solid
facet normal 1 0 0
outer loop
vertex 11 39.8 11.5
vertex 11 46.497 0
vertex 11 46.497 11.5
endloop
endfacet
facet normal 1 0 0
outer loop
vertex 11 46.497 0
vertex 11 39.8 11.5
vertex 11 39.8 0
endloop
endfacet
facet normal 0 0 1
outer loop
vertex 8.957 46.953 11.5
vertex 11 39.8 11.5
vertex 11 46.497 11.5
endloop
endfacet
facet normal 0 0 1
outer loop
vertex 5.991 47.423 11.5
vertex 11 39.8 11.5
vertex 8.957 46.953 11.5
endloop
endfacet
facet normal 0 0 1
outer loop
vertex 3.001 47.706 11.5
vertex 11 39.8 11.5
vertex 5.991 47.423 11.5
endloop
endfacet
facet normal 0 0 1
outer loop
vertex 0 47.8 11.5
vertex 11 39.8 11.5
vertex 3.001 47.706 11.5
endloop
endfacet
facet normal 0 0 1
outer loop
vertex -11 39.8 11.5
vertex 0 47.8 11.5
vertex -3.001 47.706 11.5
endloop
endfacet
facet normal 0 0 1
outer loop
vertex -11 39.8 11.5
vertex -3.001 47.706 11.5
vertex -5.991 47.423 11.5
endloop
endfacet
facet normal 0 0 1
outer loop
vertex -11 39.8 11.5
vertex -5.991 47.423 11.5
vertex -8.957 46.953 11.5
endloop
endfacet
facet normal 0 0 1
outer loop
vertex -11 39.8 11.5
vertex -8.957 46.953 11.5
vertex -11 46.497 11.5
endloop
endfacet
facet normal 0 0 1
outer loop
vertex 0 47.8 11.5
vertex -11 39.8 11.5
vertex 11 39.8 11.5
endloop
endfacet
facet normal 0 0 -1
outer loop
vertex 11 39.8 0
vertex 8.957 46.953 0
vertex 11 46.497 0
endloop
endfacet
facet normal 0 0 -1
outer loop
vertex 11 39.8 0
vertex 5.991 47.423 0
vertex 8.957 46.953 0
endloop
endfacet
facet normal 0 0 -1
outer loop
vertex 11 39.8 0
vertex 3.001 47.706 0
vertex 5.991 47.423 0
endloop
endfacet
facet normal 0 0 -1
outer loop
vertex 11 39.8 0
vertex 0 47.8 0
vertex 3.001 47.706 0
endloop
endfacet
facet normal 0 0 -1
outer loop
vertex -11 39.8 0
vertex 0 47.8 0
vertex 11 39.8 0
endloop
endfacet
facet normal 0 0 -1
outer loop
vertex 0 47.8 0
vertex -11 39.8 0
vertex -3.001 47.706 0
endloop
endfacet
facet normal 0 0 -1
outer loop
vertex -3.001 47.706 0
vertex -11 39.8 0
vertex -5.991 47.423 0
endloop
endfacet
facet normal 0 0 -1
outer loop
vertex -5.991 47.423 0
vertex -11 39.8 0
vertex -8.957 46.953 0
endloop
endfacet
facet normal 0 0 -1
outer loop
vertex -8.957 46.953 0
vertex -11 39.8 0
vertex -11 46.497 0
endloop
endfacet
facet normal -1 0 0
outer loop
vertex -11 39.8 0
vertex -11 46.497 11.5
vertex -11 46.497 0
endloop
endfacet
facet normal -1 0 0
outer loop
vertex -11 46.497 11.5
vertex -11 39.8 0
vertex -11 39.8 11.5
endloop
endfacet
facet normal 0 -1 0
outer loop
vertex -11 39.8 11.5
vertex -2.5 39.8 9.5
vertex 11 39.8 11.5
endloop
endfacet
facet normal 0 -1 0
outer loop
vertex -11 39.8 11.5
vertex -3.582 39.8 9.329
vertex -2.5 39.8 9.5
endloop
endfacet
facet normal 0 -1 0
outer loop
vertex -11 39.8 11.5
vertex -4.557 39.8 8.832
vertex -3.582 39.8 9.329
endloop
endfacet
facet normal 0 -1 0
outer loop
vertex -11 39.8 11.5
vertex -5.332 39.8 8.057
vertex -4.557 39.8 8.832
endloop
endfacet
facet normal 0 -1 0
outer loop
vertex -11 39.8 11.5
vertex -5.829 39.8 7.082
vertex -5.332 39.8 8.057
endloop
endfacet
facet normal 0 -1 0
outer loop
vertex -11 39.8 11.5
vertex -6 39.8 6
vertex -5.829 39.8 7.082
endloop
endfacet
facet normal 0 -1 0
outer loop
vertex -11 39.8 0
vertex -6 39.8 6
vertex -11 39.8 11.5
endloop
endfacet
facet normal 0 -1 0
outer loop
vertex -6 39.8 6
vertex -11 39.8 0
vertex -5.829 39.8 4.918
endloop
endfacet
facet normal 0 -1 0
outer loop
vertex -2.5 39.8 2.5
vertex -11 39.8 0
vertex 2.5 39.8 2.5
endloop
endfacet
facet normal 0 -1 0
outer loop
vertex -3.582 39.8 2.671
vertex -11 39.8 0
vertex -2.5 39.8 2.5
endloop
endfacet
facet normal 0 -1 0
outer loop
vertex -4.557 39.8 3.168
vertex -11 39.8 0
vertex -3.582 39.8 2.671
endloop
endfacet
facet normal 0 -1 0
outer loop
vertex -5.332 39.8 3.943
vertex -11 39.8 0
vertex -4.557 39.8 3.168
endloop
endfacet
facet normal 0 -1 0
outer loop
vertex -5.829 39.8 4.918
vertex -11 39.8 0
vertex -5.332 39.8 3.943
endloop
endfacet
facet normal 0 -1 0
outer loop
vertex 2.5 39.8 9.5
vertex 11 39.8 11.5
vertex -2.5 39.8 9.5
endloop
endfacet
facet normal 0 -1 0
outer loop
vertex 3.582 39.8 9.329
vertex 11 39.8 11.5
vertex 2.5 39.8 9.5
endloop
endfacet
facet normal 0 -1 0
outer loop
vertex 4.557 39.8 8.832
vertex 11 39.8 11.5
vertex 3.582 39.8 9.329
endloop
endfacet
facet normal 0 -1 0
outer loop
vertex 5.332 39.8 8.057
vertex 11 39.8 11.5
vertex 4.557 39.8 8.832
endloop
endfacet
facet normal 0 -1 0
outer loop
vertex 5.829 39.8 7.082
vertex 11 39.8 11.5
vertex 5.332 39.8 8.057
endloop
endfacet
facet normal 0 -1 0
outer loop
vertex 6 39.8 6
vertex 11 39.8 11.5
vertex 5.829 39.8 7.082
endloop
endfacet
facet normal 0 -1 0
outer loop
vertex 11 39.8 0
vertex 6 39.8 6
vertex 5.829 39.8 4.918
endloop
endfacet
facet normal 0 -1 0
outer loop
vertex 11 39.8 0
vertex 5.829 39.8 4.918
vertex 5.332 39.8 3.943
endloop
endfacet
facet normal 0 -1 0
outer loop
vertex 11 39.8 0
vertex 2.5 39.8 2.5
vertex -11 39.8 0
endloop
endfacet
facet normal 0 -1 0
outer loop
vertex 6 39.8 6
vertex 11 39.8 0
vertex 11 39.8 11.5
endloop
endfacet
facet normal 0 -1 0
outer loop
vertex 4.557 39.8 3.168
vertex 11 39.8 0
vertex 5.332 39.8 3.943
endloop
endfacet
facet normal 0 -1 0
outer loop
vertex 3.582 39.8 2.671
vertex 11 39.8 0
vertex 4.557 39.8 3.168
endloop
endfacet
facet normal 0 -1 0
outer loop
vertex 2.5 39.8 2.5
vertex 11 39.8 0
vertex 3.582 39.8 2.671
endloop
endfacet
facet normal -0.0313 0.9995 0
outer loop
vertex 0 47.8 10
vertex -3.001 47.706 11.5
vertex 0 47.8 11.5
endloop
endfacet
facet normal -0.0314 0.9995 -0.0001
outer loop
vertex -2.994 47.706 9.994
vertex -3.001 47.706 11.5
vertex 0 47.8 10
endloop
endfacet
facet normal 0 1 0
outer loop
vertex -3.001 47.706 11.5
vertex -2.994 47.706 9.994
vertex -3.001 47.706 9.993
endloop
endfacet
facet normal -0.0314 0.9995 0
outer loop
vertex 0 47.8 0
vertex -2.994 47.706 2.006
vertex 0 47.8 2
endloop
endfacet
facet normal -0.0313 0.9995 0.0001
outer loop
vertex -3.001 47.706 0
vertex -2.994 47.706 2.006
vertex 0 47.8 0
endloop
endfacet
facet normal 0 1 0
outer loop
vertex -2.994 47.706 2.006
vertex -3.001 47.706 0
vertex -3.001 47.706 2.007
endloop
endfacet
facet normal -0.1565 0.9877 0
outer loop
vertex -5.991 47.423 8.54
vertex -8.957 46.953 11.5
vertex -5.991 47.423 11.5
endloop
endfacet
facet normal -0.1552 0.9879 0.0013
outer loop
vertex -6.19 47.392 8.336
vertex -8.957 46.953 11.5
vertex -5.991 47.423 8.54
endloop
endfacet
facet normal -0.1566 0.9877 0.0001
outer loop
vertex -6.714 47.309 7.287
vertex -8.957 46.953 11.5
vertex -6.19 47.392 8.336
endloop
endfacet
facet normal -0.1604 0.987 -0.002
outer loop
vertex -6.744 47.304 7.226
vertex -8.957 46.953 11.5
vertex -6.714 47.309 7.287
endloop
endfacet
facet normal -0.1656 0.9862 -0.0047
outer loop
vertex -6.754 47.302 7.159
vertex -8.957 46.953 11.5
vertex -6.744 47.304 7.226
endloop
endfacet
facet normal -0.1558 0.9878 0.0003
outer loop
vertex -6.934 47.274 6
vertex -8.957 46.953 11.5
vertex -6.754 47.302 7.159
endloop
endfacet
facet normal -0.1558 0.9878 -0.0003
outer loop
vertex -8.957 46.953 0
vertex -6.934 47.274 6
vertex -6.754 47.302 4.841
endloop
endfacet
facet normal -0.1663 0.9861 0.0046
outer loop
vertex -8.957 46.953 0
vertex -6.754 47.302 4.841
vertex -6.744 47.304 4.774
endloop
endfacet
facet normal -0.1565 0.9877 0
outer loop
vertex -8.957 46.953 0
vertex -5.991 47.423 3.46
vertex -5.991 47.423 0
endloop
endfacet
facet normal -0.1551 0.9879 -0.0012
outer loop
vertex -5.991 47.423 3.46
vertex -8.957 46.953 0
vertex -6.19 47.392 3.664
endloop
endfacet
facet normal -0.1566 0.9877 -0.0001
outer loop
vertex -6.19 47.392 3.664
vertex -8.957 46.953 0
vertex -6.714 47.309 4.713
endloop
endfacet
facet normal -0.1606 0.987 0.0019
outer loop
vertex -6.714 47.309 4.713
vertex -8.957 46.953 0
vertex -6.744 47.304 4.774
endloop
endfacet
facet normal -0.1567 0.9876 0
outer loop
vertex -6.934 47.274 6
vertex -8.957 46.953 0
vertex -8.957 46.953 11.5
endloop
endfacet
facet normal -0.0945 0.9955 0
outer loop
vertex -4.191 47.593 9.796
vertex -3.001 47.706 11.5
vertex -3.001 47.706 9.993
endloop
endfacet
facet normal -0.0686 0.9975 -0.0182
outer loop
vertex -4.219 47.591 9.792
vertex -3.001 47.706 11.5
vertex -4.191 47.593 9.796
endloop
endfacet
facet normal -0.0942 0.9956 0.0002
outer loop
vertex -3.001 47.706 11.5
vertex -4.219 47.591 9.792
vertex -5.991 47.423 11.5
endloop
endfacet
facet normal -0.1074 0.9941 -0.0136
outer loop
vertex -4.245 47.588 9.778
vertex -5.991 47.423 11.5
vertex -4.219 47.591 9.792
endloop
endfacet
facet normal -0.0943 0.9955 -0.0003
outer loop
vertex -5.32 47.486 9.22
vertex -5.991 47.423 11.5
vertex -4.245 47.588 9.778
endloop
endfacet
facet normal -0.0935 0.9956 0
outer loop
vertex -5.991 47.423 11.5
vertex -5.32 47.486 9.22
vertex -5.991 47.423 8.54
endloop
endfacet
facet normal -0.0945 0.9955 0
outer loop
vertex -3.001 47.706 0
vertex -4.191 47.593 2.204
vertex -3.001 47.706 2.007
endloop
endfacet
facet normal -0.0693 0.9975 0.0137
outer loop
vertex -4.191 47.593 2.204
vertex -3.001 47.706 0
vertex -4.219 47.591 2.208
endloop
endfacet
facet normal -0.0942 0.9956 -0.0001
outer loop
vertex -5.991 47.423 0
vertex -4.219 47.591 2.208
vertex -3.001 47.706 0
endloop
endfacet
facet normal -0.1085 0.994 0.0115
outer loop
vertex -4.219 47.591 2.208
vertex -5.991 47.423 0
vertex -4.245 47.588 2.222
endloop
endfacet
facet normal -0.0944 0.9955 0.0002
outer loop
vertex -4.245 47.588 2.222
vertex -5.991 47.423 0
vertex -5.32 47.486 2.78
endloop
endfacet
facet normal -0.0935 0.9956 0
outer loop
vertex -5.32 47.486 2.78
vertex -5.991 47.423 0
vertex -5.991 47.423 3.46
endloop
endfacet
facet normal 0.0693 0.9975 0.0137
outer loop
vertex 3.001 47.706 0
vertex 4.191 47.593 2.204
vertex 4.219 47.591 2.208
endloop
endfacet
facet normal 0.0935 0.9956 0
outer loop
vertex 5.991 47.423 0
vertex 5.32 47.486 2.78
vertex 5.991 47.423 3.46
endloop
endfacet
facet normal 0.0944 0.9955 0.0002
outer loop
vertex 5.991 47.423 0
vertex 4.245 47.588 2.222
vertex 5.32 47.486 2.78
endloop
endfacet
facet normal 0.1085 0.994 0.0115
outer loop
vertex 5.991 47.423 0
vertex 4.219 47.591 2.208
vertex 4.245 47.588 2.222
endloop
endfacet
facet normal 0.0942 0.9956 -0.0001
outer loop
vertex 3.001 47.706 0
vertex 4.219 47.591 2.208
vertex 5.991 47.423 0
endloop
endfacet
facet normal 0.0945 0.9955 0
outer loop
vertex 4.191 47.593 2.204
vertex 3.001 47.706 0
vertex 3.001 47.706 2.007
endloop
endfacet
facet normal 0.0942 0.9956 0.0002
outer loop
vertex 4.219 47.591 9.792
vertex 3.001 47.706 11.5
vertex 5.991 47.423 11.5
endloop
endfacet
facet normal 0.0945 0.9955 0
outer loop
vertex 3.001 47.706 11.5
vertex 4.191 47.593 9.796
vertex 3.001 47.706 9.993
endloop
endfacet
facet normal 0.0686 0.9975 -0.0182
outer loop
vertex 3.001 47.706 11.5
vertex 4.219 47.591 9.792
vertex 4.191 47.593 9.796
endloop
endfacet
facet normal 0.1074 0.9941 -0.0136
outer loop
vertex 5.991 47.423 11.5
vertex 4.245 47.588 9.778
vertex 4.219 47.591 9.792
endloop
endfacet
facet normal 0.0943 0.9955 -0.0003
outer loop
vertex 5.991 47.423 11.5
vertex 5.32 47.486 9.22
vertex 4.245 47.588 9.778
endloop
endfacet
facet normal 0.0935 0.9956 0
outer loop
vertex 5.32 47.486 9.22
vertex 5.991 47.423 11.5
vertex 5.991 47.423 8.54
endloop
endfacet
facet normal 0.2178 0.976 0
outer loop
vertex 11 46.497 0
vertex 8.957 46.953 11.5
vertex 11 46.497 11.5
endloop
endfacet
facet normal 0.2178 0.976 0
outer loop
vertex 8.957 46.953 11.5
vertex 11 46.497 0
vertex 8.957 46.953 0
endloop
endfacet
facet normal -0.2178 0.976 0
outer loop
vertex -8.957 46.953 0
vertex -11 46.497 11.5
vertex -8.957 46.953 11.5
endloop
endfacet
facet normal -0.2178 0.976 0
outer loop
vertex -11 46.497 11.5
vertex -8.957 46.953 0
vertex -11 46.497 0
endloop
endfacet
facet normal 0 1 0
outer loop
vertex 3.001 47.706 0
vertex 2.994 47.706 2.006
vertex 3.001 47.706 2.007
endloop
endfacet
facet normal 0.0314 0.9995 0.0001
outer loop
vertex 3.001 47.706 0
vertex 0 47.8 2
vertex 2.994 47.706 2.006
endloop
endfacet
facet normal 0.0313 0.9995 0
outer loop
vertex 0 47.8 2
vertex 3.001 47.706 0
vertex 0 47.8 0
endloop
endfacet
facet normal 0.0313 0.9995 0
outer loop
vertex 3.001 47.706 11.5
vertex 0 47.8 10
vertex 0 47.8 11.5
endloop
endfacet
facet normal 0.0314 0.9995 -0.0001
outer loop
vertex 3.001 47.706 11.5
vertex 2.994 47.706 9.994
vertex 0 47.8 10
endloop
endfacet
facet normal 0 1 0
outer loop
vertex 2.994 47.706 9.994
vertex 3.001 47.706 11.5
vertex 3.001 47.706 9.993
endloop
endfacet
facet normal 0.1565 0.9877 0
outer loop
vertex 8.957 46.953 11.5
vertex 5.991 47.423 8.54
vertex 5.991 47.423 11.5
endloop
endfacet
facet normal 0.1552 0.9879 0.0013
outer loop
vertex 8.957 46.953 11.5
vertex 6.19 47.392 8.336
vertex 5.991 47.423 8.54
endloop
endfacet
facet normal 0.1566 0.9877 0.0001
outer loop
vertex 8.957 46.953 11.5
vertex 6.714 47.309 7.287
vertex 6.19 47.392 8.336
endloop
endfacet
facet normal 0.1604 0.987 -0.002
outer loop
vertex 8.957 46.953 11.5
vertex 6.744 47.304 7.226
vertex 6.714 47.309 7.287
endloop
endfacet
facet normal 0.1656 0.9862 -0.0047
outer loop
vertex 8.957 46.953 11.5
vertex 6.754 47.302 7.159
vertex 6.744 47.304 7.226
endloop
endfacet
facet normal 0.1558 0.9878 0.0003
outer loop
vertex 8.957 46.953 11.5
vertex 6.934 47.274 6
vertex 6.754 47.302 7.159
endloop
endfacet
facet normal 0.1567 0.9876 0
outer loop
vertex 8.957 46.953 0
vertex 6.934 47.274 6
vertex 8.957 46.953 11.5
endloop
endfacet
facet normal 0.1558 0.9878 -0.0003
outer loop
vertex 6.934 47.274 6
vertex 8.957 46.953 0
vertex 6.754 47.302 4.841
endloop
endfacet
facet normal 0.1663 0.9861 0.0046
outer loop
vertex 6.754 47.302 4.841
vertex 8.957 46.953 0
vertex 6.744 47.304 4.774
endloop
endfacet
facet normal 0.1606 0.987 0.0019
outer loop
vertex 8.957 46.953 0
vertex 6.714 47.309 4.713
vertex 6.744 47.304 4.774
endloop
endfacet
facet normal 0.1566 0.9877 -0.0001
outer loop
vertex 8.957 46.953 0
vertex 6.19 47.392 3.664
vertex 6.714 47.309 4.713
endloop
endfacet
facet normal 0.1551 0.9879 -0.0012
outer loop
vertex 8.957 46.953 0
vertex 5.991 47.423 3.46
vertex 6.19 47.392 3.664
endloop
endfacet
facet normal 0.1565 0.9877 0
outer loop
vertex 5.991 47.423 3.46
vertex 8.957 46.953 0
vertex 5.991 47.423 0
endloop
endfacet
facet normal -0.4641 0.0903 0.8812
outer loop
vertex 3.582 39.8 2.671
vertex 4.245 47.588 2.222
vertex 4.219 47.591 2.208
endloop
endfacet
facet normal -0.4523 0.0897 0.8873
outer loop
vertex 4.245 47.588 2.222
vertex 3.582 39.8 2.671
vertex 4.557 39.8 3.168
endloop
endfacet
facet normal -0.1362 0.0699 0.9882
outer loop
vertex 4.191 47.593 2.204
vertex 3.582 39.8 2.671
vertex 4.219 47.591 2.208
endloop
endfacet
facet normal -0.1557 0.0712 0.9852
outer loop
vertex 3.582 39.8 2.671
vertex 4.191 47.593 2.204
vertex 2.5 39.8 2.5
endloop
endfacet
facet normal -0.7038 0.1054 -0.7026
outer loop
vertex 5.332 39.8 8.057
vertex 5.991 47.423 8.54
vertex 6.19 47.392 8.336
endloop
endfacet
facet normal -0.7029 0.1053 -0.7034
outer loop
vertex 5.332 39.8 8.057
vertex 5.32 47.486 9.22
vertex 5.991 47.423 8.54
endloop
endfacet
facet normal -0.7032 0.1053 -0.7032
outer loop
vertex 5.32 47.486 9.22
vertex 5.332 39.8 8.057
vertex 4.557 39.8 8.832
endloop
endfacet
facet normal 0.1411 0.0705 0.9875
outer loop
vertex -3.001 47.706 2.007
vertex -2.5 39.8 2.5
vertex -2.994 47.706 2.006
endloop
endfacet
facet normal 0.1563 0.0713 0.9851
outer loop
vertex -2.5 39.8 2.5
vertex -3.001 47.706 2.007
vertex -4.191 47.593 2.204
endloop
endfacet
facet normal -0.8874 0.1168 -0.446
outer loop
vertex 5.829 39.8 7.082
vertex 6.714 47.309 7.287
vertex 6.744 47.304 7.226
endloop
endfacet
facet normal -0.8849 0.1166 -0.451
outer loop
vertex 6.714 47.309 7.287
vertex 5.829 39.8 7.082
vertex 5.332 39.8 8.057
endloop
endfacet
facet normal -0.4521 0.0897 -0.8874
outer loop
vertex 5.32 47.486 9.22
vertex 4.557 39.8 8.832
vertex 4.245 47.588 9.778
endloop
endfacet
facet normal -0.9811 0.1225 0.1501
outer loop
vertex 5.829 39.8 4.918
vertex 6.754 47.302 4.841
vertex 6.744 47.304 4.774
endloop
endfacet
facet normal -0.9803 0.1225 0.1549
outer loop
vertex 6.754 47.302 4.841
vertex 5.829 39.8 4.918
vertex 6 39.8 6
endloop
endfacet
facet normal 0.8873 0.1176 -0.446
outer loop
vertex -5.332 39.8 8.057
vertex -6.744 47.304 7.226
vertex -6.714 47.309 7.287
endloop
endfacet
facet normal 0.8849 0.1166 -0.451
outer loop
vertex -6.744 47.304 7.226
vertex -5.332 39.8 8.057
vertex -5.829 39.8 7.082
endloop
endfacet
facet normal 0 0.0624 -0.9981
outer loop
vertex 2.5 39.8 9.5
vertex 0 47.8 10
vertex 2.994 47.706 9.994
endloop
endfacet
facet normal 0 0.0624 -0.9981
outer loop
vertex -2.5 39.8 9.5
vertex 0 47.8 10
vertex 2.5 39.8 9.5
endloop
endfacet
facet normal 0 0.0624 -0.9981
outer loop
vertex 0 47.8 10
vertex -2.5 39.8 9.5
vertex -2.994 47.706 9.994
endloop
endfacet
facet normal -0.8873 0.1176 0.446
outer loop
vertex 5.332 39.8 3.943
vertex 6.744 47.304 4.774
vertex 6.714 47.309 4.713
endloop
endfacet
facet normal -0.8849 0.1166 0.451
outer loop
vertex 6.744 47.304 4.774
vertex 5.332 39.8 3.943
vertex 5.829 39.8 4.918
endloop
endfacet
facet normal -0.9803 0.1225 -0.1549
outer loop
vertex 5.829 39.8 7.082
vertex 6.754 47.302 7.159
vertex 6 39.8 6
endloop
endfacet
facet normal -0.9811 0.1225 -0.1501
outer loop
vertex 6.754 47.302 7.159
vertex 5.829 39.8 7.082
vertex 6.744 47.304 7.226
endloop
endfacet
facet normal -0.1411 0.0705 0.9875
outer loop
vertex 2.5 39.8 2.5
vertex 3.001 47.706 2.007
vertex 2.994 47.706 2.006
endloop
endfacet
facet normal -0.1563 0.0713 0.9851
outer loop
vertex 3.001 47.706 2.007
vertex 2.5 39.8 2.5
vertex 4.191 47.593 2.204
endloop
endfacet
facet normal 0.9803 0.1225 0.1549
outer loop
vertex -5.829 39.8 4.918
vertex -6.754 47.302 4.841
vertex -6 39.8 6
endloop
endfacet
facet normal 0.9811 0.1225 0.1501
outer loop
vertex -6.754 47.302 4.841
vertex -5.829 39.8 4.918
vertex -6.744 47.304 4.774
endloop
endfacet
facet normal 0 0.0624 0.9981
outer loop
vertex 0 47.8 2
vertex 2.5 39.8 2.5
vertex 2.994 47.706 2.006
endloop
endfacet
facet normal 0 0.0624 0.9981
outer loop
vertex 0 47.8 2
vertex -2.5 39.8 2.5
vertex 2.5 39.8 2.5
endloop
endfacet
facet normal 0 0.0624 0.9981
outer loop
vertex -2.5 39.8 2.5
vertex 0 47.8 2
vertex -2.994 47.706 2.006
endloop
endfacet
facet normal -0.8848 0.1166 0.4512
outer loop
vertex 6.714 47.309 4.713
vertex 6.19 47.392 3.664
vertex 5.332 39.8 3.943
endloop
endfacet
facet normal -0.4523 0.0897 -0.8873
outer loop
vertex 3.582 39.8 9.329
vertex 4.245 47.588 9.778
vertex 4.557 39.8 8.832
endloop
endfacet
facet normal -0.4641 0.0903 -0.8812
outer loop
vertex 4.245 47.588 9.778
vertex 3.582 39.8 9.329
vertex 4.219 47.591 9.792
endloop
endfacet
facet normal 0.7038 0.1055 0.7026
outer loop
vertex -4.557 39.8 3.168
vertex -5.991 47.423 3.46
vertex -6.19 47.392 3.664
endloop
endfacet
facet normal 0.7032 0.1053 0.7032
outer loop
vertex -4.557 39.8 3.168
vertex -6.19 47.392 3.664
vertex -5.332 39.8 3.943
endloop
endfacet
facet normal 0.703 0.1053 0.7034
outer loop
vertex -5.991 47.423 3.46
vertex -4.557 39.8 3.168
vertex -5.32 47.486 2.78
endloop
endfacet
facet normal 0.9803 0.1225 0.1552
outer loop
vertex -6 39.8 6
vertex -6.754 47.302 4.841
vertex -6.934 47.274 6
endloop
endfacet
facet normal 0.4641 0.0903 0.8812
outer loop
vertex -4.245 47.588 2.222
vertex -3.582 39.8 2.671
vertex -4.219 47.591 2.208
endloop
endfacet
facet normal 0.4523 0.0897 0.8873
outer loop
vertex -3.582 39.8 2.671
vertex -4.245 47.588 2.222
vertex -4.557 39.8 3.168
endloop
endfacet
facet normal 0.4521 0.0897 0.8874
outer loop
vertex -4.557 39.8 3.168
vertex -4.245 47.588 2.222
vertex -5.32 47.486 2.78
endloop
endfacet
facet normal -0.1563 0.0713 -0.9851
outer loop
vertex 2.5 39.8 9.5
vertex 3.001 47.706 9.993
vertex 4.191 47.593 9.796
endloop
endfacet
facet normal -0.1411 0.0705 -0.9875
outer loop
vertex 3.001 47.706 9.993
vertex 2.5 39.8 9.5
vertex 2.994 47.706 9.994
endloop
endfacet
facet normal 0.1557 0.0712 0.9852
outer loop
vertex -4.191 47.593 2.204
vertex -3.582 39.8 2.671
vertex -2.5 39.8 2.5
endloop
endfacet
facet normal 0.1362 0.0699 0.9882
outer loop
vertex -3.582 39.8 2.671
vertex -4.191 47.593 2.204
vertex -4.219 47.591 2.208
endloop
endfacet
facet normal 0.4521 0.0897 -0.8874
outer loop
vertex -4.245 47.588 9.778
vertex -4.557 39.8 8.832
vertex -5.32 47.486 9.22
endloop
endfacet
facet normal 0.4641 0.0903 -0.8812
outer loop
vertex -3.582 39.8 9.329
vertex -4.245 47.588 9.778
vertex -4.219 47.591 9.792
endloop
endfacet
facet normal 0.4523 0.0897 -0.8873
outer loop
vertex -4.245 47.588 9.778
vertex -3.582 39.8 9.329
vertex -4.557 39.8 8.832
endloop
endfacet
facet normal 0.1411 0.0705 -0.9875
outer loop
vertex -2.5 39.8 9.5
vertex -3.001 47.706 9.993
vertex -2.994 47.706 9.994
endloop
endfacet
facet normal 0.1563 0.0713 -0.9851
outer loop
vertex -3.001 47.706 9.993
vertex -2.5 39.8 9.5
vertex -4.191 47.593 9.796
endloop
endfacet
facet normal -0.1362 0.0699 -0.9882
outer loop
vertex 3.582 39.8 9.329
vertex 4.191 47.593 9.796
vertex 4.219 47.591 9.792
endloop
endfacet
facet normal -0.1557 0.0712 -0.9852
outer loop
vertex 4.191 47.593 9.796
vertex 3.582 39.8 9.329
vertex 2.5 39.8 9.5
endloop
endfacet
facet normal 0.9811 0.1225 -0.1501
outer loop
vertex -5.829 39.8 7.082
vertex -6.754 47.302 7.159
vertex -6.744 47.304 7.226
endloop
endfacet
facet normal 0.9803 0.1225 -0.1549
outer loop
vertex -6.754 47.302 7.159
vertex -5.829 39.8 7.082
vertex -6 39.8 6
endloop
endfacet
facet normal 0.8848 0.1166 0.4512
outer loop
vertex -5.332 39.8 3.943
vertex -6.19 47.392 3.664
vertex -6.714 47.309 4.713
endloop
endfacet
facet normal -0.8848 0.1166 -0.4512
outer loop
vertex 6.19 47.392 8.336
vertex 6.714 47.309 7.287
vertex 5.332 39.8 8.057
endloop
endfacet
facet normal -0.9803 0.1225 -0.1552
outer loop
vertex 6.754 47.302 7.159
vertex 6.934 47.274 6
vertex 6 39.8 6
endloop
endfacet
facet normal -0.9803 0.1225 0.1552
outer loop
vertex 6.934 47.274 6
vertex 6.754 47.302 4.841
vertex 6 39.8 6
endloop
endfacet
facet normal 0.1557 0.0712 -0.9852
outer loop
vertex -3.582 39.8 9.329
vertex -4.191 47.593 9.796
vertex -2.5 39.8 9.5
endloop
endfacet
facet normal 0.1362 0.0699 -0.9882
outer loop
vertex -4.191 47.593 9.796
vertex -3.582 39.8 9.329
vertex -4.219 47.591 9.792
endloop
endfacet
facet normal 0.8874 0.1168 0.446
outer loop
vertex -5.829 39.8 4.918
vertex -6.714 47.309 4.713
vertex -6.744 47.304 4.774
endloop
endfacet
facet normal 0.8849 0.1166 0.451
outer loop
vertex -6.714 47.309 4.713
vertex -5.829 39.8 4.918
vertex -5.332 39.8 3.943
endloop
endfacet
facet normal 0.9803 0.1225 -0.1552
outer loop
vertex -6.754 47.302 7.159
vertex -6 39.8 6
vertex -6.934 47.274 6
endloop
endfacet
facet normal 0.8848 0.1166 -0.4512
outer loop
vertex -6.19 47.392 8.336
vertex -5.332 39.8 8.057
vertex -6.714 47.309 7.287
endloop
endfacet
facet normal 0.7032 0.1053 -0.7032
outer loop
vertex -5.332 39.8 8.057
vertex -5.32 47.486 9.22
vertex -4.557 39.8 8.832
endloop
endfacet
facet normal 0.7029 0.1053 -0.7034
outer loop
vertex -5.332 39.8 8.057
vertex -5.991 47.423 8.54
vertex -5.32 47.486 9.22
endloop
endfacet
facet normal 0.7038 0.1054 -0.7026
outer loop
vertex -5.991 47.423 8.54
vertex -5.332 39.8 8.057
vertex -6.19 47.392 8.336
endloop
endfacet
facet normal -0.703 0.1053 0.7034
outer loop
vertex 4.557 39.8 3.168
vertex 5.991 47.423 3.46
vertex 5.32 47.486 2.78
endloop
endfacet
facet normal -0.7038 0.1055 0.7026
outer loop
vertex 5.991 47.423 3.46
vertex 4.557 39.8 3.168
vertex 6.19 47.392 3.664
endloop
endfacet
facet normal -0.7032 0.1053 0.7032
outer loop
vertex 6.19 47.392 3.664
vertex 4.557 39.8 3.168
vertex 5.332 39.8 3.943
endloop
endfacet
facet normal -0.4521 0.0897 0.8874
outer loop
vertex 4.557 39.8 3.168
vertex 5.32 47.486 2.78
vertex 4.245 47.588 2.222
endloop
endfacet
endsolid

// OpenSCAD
// cache prise usb


di=95.6;  // diametre intérieur tube

l=22;
p=8;
h=11.5;

zu=6;
hu1=3.5;
hu2=7;
hu3=8;

lu1=8.5;
lu2=12;
lu3=14;

deaxe=0;

//centreur();
priseLampe();

module centreur()
{
    difference()
    {
    hull()
    {
        trouOblong(20,lu2-.5,hu2/2);
        translate([0,-3,0]) trouOblong(5,lu2-1.5,hu2/2-1);
    }
    translate([0,20-10,0]) rotate([-90,0,0]) cylinder(10,1.2,1.2,$fn=10);

    }
}

module priseLampe()
{

difference()
{

    intersection()
    {
        translate([-l/2,di/2-p,0]) cube([l,p,h]);
       cylinder(h,di/2,di/2,$fn=100); 
    }
    
    //translate([deaxe,di/2-p,zu]) trouOblong(p,lu1,hu1/2);
    hull()
    {
        translate([deaxe,di/2-p,zu]) trouOblong(p,lu2,hu2/2);
        translate([deaxe,di/2,zu]) trouOblong(p,lu3,hu3/2);
    }
    
}
}

module trouOblong(p,l,r)
{
    hull()
    {
        translate([-l/2+r,0,0]) rotate([-90,0,0]) cylinder(p,r,r,$fn=20);
        translate([l/2-r,0,0]) rotate([-90,0,0]) cylinder(p,r,r,$fn=20);
    }

}
